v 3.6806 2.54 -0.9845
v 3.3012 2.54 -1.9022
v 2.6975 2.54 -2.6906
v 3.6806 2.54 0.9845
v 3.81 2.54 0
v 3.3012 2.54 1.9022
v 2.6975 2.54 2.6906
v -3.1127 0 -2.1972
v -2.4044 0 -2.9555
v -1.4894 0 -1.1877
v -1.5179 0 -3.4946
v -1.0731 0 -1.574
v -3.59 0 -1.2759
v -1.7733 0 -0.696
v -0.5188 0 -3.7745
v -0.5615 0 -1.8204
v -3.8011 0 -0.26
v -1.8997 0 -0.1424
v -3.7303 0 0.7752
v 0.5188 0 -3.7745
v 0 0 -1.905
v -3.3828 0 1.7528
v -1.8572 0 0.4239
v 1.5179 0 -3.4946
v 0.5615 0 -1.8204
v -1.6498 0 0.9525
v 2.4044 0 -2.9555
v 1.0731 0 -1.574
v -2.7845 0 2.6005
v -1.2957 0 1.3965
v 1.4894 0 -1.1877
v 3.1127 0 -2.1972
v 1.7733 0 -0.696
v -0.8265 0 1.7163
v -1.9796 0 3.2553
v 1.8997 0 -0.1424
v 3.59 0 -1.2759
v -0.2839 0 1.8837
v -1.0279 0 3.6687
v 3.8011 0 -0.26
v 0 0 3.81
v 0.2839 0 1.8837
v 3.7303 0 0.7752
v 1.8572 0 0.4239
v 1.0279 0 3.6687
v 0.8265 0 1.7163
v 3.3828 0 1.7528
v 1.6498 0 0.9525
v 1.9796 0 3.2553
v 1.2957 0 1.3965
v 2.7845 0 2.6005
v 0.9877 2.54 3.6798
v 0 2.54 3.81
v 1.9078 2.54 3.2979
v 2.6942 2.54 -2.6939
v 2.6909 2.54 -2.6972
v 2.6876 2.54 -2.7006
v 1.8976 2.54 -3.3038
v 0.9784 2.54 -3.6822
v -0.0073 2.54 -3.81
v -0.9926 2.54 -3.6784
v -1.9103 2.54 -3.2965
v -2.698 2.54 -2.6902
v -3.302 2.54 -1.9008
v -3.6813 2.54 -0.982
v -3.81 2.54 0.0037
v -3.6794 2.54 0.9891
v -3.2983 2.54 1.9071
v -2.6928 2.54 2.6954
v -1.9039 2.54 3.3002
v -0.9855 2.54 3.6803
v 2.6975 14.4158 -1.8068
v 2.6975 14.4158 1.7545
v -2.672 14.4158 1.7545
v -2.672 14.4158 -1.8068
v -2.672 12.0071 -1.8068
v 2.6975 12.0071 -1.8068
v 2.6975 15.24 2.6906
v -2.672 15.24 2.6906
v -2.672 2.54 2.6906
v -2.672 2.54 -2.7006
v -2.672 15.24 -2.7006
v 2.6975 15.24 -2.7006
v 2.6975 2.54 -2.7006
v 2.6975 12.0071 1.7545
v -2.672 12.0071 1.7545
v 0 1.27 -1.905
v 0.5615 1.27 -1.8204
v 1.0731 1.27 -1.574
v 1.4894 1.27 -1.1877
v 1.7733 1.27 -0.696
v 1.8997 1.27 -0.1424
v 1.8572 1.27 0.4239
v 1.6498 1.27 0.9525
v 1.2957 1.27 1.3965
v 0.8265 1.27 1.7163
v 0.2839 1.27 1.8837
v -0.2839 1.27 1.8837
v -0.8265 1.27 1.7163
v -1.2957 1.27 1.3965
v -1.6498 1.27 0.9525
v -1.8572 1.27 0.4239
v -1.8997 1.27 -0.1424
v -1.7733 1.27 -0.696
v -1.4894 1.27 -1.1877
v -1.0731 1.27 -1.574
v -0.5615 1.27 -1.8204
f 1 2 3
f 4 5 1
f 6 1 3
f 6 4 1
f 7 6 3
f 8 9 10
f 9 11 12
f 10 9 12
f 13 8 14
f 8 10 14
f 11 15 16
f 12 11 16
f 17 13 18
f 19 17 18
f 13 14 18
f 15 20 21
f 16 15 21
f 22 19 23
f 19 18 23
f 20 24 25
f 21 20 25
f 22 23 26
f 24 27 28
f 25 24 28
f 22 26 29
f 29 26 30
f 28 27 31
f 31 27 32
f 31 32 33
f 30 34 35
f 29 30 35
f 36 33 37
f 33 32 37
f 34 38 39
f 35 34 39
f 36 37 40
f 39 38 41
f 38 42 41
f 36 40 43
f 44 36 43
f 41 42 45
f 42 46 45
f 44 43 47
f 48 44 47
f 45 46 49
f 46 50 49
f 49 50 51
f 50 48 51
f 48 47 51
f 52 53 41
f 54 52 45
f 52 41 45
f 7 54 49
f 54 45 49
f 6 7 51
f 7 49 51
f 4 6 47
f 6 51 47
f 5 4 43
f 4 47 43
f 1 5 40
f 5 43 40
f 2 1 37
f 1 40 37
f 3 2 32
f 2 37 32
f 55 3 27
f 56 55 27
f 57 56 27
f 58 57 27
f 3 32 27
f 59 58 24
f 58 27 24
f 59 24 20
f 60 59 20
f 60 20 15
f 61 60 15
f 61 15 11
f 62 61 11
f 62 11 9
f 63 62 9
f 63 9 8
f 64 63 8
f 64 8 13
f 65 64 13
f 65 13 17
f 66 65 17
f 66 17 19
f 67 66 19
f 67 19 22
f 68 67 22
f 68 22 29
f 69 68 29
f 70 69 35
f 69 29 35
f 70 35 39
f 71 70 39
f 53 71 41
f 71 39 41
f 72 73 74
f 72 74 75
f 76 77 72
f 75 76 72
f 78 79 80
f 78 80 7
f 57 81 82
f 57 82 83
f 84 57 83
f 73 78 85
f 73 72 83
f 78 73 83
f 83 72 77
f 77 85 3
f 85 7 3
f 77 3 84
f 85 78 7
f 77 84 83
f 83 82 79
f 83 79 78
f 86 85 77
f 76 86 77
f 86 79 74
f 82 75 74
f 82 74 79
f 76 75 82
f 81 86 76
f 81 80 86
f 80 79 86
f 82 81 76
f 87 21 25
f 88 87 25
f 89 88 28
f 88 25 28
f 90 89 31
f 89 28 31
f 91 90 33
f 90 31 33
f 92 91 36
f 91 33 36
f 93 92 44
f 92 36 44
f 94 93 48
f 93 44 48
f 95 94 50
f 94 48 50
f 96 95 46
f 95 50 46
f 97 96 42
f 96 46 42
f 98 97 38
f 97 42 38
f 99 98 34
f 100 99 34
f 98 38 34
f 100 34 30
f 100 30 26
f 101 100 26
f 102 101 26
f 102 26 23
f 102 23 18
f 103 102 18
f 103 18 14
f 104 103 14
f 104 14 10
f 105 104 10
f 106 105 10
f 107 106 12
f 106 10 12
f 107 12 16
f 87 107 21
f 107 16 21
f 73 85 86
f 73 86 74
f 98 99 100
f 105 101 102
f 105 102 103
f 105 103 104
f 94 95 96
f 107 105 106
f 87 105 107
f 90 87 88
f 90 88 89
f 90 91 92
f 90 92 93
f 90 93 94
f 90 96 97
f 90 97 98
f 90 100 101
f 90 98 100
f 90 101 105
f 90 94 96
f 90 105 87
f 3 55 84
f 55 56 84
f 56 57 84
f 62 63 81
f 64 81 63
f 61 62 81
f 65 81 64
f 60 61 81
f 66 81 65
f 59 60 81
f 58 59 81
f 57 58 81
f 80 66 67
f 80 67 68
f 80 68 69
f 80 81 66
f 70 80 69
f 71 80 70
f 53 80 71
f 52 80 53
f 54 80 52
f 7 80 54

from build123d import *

# Parameters (mm, degrees)
SKETCH1_R           = 3.81
BOSS_EXTRUDE1_DEPTH = 2.54
SKETCH2_R           = 1.905
CUT_EXTRUDE2_DEPTH  = 1.27
SKETCH3_W           = 5.369563314
SKETCH3_H           = 5.391171223
BOSS_EXTRUDE2_DEPTH = 12.7
SKETCH4_W           = 3.561314924
SKETCH4_H           = 2.408690502
CUT_EXTRUDE3_DEPTH  = 12.7


with BuildPart() as part:
    # Sketch1 → Boss-Extrude1 (new body)
    with BuildSketch(Plane(origin=(0, 0, 0), x_dir=(1, 0, 0), z_dir=(0, 1, 0))):
        with Locations(Location((0, 0, 0), (0, 0, 270))):
            Circle(SKETCH1_R)
    extrude(amount=BOSS_EXTRUDE1_DEPTH)

    # Sketch2 → Cut-Extrude2 (cut)
    with BuildSketch(Plane.XZ):
        with Locations(Location((0, 0, 0), (0, 0, 270))):
            Circle(SKETCH2_R)
    extrude(amount=-CUT_EXTRUDE2_DEPTH, mode=Mode.SUBTRACT)

    # Sketch3 → Boss-Extrude2 (add)
    with BuildSketch(Plane(origin=(0, 2.54, 0), x_dir=(1, 0, 0), z_dir=(0, 1, 0))):
        with Locations((0.012751297, 0.004969332)):
            Rectangle(SKETCH3_W, SKETCH3_H)
    extrude(amount=BOSS_EXTRUDE2_DEPTH)

    # Sketch4 → Cut-Extrude3 (cut)
    with BuildSketch(Plane(origin=(2.697532954, 0, 0), x_dir=(0, 0, -1), z_dir=(1, 0, 0))):
        with Locations((0.026120509, 13.211421801)):
            Rectangle(SKETCH4_W, SKETCH4_H)
    extrude(amount=-CUT_EXTRUDE3_DEPTH, mode=Mode.SUBTRACT)


solid = part.part
